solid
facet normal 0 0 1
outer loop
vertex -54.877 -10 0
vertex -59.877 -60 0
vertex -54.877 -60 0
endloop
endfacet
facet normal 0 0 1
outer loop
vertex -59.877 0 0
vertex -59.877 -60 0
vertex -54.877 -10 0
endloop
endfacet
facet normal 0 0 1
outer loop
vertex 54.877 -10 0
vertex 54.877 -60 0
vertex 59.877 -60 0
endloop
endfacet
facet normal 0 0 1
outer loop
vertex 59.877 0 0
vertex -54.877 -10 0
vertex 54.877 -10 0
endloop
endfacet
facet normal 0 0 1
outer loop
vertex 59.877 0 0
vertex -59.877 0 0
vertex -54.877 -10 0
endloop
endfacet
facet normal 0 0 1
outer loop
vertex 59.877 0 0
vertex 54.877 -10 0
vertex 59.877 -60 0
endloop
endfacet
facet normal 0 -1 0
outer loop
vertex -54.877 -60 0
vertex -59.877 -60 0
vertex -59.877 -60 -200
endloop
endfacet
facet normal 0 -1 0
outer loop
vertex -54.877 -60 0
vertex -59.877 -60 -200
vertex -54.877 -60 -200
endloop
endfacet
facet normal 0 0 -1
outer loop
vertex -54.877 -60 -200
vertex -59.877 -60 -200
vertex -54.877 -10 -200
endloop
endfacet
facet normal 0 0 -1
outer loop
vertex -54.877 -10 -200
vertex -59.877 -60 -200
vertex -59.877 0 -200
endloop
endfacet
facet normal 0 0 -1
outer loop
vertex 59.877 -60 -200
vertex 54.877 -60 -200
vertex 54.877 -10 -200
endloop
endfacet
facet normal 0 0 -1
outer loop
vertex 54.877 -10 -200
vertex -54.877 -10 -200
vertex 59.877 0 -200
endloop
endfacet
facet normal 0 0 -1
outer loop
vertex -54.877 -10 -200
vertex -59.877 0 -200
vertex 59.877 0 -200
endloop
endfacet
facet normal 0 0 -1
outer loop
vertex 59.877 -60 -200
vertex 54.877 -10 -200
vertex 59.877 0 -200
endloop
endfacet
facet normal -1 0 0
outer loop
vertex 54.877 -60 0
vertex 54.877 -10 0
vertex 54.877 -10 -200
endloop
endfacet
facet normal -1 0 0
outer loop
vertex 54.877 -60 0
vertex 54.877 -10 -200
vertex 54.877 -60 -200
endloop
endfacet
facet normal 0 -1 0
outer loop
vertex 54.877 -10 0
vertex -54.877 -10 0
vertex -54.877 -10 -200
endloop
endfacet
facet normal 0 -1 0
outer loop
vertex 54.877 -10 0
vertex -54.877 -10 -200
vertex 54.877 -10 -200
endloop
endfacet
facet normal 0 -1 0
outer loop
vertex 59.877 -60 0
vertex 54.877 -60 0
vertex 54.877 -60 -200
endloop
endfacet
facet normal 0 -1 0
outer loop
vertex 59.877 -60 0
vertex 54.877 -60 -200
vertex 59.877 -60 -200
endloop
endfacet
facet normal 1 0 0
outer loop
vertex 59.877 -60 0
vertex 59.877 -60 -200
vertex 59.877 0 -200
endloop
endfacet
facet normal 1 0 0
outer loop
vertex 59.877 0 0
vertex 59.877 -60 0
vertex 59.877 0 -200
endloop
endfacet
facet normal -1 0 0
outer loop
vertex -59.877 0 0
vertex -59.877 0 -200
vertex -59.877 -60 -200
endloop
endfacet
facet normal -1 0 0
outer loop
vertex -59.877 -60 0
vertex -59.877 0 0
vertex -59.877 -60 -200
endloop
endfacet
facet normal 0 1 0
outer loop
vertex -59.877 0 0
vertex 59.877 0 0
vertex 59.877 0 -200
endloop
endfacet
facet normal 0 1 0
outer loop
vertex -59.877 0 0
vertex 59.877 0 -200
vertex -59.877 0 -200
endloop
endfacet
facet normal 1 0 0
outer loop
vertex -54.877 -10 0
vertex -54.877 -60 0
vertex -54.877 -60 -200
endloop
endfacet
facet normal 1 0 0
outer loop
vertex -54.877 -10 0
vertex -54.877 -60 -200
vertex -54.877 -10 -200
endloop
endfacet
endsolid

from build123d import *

# Parameters (mm, degrees)
SALIENTE_EXTRUIR1_DEPTH = 200


with BuildPart() as part:
    # Croquis1 → Saliente-Extruir1 (new body)
    with BuildSketch(Plane.XY):
        Polygon((0, 0), (-59.877040429, 0), (-59.877040429, -60), (-54.877040429, -60), (-54.877040429, -10), (54.877040429, -10), (54.877040429, -60), (59.877040429, -60), (59.877040429, 0), align=None)
    extrude(amount=-SALIENTE_EXTRUIR1_DEPTH)


solid = part.part
